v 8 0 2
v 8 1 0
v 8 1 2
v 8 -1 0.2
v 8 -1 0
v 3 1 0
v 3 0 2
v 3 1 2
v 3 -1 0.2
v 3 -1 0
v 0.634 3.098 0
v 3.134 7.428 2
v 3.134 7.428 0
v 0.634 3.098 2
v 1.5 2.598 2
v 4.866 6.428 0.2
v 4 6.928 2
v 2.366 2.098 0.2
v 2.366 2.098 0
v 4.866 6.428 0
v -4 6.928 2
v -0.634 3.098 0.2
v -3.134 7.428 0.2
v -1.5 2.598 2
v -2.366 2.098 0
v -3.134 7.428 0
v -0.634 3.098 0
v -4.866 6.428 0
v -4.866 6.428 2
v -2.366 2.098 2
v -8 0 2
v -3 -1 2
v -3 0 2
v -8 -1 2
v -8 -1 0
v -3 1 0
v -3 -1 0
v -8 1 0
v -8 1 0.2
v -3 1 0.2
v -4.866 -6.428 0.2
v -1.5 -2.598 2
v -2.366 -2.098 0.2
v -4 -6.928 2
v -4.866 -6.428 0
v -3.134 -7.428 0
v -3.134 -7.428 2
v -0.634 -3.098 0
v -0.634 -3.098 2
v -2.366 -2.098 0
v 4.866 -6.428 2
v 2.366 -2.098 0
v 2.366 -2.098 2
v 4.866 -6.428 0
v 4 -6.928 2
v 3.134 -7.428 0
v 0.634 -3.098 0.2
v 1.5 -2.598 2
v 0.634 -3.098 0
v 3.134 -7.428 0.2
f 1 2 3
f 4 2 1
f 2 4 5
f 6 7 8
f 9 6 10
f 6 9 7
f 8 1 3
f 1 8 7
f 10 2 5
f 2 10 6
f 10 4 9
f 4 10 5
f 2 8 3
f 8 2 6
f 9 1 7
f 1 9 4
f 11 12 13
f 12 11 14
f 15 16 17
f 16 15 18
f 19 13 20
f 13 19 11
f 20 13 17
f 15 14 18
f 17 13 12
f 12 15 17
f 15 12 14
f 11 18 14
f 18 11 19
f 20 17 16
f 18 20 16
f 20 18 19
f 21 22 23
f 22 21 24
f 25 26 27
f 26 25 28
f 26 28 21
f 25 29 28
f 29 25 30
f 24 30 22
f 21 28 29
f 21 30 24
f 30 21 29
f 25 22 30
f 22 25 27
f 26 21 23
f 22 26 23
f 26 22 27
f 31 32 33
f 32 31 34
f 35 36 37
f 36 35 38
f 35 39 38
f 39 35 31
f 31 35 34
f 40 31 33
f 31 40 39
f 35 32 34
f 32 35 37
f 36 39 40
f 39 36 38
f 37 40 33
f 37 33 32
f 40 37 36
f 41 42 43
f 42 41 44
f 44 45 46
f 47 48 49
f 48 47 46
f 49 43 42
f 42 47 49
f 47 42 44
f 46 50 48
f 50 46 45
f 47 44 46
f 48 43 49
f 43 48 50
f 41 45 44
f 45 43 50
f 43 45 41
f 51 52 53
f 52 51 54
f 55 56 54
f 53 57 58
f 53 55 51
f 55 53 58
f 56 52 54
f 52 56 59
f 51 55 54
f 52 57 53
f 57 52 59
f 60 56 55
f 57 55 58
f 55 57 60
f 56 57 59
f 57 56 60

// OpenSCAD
include <../libs/hardware-recess.scad>;

/*
difference(){
    cube([20, 20, 20]);
    translate([10,10, 0]) bolt_nut(20, M5);
}
*/

//alu_connector(10, 1);

tooth_len = 25/ 2 - 8/2 - 3;

module tooth(tooth_len, tooth_width){
    blade_w = 0.2;
    tooth_depth = 2;

    hull(){
        cube([tooth_len, blade_w, blade_w]);
        translate([0, tooth_width - 1, 0])
            cube([tooth_len, 1, tooth_depth]);
            
    }
}



module rotate_teeth(count, tooth_len, tooth_width, r){
    // Post here solves rotation
    // http://forum.openscad.org/Re-Rotate-relative-or-make-spokes-td14882.html
    for (i=[0:count]){
        rotate([0,0, 360/count*i])
            translate([r, -tooth_width/2, 0])
                tooth(tooth_len, tooth_width);
    }
}

//tooth(5,2);
rotate_teeth(6, 5, 2, 3);

//tooth(tooth_len);

/*
NoArm = 7; // The number of arms / sides of the polygon
ArmWide = 3; // The width (short side) of the arms
ArmHigh = 3; // The height (along the Z axis) of the arms
ArmLong = 80; // The radial length of the arms

ArmsOnEdges = true; // Should the arms intersect the edge or vertices of the polygon

CircRadius = 2; // The radius of the polygon

union()  // Union isn't strictly necessary because everything at the top level is implicitly unioned
{
    for (i=[1:NoArm])
            rotate([0,0,360/NoArm*i]) // Rotate the arm after it's centered
            translate([0,-ArmWide/2,0]) // Center the arm around the X axis
            cube([ArmLong, ArmWide, ArmHigh]); // Make the arm extend along the X axis

}
*/
